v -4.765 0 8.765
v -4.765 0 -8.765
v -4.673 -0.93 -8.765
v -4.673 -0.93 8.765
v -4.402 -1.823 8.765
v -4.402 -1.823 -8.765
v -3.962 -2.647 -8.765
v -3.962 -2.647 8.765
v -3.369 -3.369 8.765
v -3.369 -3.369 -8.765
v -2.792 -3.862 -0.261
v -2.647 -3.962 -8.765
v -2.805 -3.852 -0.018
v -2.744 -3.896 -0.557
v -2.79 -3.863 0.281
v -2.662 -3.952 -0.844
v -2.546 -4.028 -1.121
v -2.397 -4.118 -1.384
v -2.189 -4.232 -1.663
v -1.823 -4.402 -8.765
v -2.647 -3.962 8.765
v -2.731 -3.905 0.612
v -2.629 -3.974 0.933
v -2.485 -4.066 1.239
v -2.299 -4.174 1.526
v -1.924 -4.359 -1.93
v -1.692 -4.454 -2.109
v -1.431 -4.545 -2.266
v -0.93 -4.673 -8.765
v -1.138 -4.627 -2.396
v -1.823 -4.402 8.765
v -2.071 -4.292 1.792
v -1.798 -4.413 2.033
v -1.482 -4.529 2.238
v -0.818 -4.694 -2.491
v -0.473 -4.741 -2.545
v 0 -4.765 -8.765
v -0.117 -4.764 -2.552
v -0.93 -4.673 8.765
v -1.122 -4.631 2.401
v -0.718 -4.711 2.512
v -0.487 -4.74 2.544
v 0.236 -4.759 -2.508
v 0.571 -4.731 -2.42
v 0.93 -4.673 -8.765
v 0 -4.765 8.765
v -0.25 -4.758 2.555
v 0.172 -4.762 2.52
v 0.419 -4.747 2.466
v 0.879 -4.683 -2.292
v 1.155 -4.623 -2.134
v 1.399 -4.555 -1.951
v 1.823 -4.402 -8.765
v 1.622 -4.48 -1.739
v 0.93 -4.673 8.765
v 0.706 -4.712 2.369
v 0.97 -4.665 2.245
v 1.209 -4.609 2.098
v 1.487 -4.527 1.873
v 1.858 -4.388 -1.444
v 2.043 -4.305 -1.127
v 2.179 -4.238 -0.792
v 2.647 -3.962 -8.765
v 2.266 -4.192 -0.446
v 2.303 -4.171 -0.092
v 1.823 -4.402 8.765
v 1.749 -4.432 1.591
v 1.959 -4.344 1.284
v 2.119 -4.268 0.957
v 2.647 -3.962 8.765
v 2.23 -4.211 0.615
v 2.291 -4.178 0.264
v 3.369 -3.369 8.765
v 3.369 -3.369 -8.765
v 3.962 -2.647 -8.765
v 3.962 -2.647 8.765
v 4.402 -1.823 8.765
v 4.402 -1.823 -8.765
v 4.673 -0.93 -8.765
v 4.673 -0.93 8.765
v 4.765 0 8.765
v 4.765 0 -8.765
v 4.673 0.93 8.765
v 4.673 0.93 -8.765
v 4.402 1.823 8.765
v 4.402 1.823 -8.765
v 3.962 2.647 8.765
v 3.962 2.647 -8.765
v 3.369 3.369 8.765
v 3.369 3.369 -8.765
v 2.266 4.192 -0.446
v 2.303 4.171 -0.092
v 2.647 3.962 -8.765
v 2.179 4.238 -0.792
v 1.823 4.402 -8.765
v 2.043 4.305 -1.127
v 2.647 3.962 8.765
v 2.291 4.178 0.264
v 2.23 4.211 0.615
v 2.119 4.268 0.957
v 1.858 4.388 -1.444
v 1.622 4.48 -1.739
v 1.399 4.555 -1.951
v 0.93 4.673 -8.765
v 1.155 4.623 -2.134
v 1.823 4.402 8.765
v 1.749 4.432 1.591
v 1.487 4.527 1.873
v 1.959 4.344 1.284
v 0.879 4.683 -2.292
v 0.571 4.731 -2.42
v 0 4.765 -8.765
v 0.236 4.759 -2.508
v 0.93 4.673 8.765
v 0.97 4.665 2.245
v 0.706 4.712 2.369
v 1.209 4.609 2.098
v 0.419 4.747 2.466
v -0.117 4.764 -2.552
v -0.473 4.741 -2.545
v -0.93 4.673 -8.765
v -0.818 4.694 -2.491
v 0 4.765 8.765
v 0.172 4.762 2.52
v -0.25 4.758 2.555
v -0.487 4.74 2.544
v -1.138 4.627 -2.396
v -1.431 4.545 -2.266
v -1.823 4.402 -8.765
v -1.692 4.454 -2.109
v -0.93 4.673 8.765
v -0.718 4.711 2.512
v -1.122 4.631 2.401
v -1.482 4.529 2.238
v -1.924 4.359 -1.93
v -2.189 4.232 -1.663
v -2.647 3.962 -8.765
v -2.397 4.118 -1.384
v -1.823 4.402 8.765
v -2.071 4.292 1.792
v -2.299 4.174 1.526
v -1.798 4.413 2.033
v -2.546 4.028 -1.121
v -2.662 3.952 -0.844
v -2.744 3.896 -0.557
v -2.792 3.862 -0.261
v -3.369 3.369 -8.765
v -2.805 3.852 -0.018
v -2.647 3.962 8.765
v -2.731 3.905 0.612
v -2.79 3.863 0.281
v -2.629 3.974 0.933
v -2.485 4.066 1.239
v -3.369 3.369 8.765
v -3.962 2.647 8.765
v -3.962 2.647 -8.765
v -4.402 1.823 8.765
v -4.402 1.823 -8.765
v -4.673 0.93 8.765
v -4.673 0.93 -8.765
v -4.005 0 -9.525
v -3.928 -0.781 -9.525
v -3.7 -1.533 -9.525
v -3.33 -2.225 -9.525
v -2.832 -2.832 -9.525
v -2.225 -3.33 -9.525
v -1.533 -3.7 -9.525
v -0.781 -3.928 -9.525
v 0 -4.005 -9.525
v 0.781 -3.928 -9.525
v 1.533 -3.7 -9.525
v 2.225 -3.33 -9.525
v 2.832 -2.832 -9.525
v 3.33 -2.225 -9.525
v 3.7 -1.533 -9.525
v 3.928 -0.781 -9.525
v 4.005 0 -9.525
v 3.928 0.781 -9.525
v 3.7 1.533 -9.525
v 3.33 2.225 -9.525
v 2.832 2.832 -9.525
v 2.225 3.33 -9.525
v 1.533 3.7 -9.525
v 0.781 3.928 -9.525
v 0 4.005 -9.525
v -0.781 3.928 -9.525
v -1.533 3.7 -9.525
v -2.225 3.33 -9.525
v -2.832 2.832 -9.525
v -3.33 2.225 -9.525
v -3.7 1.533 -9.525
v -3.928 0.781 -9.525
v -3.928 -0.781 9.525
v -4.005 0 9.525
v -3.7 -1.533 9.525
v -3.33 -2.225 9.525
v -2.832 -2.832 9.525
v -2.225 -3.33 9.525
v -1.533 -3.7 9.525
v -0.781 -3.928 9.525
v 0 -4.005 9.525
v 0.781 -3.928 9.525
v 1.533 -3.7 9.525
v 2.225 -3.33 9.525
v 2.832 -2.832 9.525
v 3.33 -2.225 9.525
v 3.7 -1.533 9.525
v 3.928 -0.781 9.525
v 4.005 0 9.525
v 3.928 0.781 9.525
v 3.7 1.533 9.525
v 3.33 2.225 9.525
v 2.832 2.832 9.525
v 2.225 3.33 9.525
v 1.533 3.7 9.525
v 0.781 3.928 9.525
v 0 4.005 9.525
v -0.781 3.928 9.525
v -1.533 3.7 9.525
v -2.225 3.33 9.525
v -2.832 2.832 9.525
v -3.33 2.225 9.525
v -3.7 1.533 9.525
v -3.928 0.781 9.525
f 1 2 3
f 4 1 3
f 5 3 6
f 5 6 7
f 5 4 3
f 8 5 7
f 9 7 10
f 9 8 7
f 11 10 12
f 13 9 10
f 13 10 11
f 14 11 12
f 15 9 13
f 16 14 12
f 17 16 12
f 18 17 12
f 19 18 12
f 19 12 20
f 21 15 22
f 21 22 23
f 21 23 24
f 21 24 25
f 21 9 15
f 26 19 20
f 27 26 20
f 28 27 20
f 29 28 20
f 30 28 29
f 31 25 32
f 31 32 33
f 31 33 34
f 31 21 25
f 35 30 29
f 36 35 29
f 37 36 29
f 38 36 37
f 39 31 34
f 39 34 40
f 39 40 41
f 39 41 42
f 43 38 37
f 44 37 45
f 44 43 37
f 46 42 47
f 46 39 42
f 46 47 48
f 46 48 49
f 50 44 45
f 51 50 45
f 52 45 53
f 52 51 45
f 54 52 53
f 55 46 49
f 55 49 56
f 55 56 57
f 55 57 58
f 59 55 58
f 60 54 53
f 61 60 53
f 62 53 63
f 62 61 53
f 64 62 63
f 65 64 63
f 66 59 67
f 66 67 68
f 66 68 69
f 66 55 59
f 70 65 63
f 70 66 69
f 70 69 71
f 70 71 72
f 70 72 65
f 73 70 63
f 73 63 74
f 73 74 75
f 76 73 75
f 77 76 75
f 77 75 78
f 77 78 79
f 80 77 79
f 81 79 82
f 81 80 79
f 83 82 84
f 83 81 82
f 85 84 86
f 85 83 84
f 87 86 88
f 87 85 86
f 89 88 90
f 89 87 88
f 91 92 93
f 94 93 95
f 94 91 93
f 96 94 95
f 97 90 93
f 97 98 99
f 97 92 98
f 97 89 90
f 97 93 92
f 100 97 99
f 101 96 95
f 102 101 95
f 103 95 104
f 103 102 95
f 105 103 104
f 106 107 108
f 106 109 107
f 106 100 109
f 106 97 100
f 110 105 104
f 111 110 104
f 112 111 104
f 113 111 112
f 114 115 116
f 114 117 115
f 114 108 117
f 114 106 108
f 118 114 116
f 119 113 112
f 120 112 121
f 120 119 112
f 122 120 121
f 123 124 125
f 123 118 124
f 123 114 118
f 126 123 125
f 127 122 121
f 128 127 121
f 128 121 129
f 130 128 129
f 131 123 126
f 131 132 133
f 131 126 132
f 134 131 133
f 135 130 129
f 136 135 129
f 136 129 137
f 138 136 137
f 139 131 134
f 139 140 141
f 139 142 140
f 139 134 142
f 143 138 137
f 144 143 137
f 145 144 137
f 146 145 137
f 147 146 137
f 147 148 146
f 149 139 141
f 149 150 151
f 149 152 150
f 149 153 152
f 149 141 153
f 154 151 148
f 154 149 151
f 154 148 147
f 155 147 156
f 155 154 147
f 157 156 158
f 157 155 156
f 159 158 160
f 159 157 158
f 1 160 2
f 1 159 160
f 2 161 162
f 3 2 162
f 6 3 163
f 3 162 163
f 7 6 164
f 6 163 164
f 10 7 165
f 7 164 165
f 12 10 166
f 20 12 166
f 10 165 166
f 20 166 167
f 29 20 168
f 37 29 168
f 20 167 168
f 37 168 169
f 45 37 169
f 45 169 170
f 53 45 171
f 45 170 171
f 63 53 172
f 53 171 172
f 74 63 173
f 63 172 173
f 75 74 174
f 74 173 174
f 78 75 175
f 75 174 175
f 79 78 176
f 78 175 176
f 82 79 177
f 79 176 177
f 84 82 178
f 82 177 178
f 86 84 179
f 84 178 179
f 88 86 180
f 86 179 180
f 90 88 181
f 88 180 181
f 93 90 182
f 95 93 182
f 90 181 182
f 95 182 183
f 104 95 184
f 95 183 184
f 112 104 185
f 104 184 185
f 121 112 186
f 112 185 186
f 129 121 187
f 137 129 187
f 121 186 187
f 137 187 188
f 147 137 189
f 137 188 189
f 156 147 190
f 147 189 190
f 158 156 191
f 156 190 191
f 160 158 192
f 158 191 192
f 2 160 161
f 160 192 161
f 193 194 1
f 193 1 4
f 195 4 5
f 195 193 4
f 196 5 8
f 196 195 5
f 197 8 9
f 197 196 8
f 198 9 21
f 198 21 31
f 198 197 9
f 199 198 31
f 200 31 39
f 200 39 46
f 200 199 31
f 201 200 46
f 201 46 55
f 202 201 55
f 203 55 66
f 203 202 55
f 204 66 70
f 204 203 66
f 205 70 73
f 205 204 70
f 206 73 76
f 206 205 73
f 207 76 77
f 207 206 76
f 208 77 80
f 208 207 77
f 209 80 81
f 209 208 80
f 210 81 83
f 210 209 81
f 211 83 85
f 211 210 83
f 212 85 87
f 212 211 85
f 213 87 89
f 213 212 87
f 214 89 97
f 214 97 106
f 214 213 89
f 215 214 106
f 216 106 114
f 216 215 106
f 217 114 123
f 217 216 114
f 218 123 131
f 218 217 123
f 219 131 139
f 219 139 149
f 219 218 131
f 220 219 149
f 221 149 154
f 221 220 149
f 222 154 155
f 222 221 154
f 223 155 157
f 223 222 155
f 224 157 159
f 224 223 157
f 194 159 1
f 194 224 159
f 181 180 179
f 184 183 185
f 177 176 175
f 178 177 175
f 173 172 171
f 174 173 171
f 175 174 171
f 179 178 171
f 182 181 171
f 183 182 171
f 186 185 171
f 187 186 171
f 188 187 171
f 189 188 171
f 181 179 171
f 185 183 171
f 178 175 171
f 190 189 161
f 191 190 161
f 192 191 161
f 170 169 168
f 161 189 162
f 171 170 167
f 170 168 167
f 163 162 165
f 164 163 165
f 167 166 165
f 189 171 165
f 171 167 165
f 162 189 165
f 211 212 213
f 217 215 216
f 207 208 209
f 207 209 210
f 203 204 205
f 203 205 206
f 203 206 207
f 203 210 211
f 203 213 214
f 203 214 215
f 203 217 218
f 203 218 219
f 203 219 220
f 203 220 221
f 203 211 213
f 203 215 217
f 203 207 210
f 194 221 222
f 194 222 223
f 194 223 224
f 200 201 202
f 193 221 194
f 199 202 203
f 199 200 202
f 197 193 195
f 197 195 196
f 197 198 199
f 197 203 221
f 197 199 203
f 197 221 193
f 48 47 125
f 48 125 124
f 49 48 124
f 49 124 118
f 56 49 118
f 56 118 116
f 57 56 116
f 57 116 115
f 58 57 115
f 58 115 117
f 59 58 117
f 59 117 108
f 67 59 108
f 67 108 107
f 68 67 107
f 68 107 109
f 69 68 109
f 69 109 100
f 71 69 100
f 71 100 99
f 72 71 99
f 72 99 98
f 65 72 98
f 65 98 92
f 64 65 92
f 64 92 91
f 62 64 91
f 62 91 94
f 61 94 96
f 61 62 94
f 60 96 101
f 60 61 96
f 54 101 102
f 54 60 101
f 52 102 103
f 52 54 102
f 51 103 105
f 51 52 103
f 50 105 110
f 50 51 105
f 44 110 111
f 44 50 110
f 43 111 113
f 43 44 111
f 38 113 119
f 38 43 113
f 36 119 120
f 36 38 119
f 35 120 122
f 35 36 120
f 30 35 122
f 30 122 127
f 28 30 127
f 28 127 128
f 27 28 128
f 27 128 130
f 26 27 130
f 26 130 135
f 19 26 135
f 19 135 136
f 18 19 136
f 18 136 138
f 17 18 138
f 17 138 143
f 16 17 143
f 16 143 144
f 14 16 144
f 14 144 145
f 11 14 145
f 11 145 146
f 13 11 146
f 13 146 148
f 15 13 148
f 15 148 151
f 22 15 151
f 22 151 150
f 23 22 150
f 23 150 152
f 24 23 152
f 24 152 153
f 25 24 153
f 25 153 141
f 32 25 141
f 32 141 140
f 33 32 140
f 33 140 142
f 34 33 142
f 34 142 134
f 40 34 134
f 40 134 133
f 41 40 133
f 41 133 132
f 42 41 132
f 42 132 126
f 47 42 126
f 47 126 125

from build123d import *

# Parameters (mm, degrees)
SKETCH1_R               = 4.765
BOSS_EXTRUDE1_DEPTH     = 9.525
CHAMFER1_SIZE           = 0.76
CUT_EXTRUDE1_DEPTH      = 12.667736499
CUT_EXTRUDE1_DEPTH_BACK = 12.667736499
SKETCH2_R               = 2.555


with BuildPart() as part:
    # Sketch1 → Boss-Extrude1 (new, symmetric)
    with BuildSketch(Plane.XY):
        with Locations(Location((0, 0, 0), (0, 0, 180))):
            Circle(SKETCH1_R)
    extrude(amount=BOSS_EXTRUDE1_DEPTH, both=True)

    # Chamfer1
    chamfer1_edges = [part.edges().sort_by_distance(p)[0] for p in [
        (4.765, 0, -9.525),
        (4.765, 0, 9.525),
    ]]
    chamfer(chamfer1_edges, length=CHAMFER1_SIZE)

    # Sketch2 → Cut-Extrude1 (cut, two sides: drawn at the far end of the back side and taken through both)
    with BuildSketch(Plane(origin=(0, 0, 0), x_dir=(1, 0, 0), z_dir=(0, 1, 0)).offset(-CUT_EXTRUDE1_DEPTH_BACK)):
        with Locations(Location((-0.25, 0, 0), (0, 0, 270))):
            Circle(SKETCH2_R)
    extrude(amount=CUT_EXTRUDE1_DEPTH + CUT_EXTRUDE1_DEPTH_BACK, mode=Mode.SUBTRACT)


solid = part.part
